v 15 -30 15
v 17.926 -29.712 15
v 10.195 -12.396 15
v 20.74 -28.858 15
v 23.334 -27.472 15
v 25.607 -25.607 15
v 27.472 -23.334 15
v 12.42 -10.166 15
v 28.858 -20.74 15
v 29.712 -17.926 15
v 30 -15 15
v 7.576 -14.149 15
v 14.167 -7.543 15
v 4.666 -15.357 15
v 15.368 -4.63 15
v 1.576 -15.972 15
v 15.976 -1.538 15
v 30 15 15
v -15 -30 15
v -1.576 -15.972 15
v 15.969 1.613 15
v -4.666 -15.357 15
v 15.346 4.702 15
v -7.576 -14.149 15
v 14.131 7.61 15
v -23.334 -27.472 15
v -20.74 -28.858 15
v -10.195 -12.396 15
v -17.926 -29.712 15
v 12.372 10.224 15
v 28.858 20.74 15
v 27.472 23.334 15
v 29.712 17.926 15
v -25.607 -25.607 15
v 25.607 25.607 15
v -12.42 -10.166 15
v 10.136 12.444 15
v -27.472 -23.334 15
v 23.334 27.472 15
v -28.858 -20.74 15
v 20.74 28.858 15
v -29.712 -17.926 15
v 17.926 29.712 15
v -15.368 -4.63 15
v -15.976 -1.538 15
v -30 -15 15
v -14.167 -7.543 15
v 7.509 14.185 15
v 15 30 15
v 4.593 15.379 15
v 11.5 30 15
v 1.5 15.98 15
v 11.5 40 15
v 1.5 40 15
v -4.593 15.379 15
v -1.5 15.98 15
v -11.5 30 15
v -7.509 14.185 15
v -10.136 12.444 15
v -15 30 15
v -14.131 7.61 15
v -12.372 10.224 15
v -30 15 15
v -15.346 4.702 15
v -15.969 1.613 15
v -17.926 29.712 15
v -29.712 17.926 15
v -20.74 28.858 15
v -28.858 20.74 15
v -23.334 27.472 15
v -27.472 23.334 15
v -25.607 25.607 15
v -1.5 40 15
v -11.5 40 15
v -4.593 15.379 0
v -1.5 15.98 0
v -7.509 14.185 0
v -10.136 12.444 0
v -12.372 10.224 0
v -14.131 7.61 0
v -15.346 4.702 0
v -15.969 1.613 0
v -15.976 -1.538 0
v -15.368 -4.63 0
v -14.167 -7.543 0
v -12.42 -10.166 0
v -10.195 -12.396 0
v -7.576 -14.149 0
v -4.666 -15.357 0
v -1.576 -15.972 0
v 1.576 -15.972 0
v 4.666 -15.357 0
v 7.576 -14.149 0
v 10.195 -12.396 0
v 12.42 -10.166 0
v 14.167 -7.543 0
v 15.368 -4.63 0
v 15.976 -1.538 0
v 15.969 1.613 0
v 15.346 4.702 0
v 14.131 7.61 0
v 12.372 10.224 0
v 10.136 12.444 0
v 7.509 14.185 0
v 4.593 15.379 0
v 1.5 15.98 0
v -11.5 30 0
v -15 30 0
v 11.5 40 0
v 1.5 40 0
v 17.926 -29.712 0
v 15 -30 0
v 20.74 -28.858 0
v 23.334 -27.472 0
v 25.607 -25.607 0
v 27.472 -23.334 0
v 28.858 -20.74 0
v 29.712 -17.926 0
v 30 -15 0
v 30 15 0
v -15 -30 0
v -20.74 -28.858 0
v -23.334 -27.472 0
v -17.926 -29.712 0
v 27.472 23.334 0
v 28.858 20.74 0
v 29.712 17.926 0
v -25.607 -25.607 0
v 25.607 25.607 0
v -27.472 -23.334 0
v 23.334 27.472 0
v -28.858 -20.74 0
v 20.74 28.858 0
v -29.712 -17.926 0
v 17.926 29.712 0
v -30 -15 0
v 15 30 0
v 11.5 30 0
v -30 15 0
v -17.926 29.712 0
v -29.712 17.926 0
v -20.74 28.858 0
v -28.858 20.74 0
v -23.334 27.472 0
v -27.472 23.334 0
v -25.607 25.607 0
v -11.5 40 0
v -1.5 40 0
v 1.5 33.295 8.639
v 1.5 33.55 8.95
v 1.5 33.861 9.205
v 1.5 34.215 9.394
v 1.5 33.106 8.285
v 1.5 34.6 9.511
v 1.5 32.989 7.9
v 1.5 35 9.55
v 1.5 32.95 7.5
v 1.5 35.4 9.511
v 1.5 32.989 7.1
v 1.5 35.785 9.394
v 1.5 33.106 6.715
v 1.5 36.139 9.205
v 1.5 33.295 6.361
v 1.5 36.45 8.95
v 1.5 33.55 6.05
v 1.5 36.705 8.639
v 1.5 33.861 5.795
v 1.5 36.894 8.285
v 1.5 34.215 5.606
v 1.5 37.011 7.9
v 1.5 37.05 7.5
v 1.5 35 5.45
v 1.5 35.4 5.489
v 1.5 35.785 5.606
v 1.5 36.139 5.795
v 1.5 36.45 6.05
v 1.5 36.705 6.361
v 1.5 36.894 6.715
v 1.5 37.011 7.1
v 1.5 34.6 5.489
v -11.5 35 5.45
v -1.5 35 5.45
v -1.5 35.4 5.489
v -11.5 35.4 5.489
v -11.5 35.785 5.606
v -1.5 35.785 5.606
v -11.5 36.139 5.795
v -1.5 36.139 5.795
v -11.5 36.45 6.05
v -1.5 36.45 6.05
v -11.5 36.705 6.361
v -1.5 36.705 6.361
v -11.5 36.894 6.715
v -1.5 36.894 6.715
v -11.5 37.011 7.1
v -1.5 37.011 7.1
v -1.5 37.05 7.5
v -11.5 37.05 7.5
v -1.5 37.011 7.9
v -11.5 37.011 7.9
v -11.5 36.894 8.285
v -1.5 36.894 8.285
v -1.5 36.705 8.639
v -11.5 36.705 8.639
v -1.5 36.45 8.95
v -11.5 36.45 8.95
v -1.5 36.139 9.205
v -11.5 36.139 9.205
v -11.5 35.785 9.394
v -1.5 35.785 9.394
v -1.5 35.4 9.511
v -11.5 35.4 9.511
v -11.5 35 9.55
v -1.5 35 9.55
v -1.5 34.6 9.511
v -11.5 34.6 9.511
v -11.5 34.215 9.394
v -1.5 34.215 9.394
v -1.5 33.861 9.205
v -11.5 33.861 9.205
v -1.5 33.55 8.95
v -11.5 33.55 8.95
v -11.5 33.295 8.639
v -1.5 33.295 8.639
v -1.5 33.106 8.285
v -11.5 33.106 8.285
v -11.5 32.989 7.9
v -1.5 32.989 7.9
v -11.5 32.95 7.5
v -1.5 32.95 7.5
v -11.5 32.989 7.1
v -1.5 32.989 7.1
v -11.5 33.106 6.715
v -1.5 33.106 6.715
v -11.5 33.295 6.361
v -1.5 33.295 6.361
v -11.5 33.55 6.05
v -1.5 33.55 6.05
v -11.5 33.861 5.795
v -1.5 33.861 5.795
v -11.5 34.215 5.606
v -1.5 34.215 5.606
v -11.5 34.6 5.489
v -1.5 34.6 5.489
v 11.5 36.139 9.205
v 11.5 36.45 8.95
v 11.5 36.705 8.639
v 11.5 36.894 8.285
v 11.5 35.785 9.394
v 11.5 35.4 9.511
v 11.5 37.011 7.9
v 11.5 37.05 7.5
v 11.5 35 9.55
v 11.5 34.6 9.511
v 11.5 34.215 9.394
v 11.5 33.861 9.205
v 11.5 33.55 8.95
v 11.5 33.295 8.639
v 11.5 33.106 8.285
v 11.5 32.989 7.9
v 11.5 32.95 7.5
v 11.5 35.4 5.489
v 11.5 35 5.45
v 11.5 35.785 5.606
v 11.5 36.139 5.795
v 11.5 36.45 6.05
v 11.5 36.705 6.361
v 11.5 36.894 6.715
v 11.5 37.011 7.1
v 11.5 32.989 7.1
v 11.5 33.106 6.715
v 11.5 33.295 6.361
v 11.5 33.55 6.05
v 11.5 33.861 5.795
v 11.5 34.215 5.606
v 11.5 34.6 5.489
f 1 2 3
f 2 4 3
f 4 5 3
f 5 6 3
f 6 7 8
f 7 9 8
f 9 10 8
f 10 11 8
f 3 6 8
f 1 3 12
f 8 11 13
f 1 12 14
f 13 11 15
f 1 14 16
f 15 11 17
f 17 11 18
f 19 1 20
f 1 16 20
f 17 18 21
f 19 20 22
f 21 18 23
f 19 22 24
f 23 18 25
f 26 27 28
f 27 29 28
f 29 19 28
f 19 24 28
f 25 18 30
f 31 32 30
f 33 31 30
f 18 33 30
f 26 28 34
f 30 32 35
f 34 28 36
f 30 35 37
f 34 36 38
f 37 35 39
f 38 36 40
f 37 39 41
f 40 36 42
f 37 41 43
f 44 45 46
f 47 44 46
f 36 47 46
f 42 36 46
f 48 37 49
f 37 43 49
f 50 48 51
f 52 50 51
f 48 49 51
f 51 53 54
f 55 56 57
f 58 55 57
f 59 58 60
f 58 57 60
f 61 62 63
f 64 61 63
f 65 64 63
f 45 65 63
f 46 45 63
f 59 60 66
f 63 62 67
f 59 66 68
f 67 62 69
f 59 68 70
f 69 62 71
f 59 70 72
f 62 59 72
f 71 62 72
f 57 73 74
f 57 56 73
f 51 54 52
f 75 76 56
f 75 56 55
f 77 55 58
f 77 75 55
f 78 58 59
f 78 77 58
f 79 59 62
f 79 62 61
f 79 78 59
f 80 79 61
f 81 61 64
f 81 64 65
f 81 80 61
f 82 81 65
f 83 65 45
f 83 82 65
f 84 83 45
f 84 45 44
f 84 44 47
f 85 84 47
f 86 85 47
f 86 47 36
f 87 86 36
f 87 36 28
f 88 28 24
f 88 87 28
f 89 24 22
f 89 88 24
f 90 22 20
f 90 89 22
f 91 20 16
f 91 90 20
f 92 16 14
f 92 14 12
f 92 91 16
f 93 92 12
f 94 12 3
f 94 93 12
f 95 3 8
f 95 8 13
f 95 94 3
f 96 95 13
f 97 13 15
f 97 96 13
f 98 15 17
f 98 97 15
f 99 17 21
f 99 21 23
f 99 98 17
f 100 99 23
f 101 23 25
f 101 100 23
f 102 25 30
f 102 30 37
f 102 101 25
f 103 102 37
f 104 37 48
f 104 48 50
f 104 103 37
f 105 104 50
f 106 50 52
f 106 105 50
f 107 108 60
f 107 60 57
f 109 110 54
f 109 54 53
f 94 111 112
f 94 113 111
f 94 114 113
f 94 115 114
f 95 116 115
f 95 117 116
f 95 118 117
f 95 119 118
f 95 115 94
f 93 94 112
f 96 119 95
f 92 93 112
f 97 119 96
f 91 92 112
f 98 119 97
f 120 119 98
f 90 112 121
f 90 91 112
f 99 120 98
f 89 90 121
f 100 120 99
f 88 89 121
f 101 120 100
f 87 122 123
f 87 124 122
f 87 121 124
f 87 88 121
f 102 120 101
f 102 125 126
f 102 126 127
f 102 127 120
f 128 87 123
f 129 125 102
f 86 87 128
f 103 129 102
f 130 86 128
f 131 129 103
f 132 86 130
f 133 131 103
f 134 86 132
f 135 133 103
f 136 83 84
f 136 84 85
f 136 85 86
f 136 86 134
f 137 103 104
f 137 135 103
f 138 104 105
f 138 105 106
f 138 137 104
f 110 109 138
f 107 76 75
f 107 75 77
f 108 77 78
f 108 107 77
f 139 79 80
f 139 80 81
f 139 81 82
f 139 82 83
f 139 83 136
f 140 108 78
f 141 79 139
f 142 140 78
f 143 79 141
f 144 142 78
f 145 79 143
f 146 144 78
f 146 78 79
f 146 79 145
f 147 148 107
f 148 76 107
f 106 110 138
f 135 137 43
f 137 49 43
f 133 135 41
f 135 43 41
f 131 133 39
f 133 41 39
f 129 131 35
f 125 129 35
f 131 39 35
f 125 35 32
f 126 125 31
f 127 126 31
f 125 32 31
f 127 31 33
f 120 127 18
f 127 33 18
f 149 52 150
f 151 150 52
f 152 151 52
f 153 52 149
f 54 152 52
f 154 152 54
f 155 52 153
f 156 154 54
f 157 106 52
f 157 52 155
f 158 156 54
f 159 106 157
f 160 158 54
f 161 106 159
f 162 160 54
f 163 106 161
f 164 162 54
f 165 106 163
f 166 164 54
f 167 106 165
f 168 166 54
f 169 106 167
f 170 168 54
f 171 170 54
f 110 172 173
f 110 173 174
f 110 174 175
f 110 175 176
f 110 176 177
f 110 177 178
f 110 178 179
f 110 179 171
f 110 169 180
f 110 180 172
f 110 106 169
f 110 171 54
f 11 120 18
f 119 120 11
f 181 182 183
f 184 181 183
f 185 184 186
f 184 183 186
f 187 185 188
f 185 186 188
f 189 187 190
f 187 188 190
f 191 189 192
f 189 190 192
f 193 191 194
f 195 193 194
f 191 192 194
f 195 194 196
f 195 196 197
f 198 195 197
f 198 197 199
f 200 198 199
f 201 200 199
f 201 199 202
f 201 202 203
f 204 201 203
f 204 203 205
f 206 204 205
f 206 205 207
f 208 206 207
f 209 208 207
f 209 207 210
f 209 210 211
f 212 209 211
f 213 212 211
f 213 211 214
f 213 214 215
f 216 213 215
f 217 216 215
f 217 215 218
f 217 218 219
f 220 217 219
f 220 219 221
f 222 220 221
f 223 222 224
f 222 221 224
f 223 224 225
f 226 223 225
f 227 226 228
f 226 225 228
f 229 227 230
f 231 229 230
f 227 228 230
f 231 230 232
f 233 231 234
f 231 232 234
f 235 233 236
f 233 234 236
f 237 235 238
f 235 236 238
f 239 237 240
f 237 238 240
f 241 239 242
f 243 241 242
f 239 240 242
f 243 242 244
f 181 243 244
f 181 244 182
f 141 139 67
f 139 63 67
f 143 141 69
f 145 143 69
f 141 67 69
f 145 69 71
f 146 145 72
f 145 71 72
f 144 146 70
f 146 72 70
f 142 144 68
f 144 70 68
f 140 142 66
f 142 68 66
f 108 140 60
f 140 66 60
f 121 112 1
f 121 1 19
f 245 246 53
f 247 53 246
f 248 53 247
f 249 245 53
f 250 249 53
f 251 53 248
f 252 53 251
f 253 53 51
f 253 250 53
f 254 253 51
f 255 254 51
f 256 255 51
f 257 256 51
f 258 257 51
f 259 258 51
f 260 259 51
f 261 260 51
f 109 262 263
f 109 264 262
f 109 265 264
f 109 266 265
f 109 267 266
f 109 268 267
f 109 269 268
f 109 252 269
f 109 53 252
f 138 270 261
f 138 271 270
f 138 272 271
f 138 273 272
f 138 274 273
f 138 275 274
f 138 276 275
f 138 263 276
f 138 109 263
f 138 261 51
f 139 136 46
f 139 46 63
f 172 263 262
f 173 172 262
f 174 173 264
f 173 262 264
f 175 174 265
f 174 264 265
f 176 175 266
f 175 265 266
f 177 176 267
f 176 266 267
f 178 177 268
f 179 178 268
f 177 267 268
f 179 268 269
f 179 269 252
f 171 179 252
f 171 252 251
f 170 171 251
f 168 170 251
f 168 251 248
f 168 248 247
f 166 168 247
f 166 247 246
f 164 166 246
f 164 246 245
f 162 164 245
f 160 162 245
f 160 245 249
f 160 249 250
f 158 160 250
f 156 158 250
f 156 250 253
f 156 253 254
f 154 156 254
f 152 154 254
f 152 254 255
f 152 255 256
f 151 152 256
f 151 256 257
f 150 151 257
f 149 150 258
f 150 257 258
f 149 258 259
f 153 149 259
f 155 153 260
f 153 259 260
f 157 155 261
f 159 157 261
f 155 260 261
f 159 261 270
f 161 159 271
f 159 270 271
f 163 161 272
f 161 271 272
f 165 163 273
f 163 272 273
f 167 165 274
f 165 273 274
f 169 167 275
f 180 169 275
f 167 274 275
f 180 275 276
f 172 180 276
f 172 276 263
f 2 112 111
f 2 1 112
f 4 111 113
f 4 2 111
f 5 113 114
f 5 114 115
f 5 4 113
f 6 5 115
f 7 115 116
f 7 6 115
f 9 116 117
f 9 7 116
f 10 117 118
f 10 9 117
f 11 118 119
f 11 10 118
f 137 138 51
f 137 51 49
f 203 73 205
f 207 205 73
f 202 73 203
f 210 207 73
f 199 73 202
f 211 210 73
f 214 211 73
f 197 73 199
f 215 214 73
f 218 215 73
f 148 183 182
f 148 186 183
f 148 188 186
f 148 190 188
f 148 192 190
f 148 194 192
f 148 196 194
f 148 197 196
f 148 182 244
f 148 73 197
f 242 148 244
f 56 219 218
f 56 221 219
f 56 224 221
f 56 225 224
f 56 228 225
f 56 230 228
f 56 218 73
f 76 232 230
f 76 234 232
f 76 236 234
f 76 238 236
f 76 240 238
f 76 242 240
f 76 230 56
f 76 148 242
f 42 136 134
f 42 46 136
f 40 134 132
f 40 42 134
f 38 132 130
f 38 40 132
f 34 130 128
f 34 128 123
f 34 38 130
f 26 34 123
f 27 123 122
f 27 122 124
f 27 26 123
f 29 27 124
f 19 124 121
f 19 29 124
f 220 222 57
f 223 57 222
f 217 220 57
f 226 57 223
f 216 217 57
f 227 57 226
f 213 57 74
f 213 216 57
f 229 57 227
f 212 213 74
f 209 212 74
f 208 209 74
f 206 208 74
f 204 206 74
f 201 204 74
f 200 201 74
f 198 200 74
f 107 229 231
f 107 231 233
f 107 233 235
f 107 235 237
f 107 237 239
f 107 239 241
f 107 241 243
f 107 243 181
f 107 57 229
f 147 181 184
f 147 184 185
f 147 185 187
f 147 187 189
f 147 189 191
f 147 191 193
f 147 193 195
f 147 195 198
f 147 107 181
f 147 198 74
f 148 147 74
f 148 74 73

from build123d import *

# Parameters (mm, degrees)
BOSS_EXTRUDE2_DEPTH = 15
FILLET5_R           = 15
FILLET6_R           = 15
FILLET7_R           = 15
FILLET8_R           = 15
SKETCH4_R           = 2.05
CUT_EXTRUDE2_DEPTH  = 23


with BuildPart() as part:
    # Sketch3 → Boss-Extrude2 (new body)
    with BuildSketch(Plane.XY):
        with BuildLine():
            Line((-1.5, 40), (-1.5, 15.979752814))
            ThreePointArc((-1.5, 15.979752814), (0, -16.05), (1.5, 15.979752814))
            Line((1.5, 15.979752814), (1.5, 30))
            Line((1.5, 30), (1.5, 40))
            Line((1.5, 40), (11.5, 40))
            Line((11.5, 40), (11.5, 30))
            Line((11.5, 30), (30, 30))
            Line((30, 30), (30, -30))
            Line((30, -30), (-30, -30))
            Line((-30, -30), (-30, 30))
            Line((-30, 30), (-11.5, 30))
            Line((-11.5, 30), (-11.5, 40))
            Line((-11.5, 40), (-1.5, 40))
        make_face()
    extrude(amount=BOSS_EXTRUDE2_DEPTH)

    # Fillet5
    fillet5_edges = [part.edges().sort_by_distance(p)[0] for p in [
        (30, 30, 7.5),
    ]]
    fillet(fillet5_edges, radius=FILLET5_R)

    # Fillet6
    fillet6_edges = [part.edges().sort_by_distance(p)[0] for p in [
        (-30, 30, 7.5),
    ]]
    fillet(fillet6_edges, radius=FILLET6_R)

    # Fillet7
    fillet7_edges = [part.edges().sort_by_distance(p)[0] for p in [
        (-30, -30, 7.5),
    ]]
    fillet(fillet7_edges, radius=FILLET7_R)

    # Fillet8
    fillet8_edges = [part.edges().sort_by_distance(p)[0] for p in [
        (30, -30, 7.5),
    ]]
    fillet(fillet8_edges, radius=FILLET8_R)

    # Sketch4 → Cut-Extrude2 (cut)
    with BuildSketch(Plane(origin=(11.5, 0, 0), x_dir=(0, 0, -1), z_dir=(1, 0, 0))):
        with Locations((-7.5, 35)):
            Circle(SKETCH4_R)
    extrude(amount=-CUT_EXTRUDE2_DEPTH, mode=Mode.SUBTRACT)


solid = part.part
